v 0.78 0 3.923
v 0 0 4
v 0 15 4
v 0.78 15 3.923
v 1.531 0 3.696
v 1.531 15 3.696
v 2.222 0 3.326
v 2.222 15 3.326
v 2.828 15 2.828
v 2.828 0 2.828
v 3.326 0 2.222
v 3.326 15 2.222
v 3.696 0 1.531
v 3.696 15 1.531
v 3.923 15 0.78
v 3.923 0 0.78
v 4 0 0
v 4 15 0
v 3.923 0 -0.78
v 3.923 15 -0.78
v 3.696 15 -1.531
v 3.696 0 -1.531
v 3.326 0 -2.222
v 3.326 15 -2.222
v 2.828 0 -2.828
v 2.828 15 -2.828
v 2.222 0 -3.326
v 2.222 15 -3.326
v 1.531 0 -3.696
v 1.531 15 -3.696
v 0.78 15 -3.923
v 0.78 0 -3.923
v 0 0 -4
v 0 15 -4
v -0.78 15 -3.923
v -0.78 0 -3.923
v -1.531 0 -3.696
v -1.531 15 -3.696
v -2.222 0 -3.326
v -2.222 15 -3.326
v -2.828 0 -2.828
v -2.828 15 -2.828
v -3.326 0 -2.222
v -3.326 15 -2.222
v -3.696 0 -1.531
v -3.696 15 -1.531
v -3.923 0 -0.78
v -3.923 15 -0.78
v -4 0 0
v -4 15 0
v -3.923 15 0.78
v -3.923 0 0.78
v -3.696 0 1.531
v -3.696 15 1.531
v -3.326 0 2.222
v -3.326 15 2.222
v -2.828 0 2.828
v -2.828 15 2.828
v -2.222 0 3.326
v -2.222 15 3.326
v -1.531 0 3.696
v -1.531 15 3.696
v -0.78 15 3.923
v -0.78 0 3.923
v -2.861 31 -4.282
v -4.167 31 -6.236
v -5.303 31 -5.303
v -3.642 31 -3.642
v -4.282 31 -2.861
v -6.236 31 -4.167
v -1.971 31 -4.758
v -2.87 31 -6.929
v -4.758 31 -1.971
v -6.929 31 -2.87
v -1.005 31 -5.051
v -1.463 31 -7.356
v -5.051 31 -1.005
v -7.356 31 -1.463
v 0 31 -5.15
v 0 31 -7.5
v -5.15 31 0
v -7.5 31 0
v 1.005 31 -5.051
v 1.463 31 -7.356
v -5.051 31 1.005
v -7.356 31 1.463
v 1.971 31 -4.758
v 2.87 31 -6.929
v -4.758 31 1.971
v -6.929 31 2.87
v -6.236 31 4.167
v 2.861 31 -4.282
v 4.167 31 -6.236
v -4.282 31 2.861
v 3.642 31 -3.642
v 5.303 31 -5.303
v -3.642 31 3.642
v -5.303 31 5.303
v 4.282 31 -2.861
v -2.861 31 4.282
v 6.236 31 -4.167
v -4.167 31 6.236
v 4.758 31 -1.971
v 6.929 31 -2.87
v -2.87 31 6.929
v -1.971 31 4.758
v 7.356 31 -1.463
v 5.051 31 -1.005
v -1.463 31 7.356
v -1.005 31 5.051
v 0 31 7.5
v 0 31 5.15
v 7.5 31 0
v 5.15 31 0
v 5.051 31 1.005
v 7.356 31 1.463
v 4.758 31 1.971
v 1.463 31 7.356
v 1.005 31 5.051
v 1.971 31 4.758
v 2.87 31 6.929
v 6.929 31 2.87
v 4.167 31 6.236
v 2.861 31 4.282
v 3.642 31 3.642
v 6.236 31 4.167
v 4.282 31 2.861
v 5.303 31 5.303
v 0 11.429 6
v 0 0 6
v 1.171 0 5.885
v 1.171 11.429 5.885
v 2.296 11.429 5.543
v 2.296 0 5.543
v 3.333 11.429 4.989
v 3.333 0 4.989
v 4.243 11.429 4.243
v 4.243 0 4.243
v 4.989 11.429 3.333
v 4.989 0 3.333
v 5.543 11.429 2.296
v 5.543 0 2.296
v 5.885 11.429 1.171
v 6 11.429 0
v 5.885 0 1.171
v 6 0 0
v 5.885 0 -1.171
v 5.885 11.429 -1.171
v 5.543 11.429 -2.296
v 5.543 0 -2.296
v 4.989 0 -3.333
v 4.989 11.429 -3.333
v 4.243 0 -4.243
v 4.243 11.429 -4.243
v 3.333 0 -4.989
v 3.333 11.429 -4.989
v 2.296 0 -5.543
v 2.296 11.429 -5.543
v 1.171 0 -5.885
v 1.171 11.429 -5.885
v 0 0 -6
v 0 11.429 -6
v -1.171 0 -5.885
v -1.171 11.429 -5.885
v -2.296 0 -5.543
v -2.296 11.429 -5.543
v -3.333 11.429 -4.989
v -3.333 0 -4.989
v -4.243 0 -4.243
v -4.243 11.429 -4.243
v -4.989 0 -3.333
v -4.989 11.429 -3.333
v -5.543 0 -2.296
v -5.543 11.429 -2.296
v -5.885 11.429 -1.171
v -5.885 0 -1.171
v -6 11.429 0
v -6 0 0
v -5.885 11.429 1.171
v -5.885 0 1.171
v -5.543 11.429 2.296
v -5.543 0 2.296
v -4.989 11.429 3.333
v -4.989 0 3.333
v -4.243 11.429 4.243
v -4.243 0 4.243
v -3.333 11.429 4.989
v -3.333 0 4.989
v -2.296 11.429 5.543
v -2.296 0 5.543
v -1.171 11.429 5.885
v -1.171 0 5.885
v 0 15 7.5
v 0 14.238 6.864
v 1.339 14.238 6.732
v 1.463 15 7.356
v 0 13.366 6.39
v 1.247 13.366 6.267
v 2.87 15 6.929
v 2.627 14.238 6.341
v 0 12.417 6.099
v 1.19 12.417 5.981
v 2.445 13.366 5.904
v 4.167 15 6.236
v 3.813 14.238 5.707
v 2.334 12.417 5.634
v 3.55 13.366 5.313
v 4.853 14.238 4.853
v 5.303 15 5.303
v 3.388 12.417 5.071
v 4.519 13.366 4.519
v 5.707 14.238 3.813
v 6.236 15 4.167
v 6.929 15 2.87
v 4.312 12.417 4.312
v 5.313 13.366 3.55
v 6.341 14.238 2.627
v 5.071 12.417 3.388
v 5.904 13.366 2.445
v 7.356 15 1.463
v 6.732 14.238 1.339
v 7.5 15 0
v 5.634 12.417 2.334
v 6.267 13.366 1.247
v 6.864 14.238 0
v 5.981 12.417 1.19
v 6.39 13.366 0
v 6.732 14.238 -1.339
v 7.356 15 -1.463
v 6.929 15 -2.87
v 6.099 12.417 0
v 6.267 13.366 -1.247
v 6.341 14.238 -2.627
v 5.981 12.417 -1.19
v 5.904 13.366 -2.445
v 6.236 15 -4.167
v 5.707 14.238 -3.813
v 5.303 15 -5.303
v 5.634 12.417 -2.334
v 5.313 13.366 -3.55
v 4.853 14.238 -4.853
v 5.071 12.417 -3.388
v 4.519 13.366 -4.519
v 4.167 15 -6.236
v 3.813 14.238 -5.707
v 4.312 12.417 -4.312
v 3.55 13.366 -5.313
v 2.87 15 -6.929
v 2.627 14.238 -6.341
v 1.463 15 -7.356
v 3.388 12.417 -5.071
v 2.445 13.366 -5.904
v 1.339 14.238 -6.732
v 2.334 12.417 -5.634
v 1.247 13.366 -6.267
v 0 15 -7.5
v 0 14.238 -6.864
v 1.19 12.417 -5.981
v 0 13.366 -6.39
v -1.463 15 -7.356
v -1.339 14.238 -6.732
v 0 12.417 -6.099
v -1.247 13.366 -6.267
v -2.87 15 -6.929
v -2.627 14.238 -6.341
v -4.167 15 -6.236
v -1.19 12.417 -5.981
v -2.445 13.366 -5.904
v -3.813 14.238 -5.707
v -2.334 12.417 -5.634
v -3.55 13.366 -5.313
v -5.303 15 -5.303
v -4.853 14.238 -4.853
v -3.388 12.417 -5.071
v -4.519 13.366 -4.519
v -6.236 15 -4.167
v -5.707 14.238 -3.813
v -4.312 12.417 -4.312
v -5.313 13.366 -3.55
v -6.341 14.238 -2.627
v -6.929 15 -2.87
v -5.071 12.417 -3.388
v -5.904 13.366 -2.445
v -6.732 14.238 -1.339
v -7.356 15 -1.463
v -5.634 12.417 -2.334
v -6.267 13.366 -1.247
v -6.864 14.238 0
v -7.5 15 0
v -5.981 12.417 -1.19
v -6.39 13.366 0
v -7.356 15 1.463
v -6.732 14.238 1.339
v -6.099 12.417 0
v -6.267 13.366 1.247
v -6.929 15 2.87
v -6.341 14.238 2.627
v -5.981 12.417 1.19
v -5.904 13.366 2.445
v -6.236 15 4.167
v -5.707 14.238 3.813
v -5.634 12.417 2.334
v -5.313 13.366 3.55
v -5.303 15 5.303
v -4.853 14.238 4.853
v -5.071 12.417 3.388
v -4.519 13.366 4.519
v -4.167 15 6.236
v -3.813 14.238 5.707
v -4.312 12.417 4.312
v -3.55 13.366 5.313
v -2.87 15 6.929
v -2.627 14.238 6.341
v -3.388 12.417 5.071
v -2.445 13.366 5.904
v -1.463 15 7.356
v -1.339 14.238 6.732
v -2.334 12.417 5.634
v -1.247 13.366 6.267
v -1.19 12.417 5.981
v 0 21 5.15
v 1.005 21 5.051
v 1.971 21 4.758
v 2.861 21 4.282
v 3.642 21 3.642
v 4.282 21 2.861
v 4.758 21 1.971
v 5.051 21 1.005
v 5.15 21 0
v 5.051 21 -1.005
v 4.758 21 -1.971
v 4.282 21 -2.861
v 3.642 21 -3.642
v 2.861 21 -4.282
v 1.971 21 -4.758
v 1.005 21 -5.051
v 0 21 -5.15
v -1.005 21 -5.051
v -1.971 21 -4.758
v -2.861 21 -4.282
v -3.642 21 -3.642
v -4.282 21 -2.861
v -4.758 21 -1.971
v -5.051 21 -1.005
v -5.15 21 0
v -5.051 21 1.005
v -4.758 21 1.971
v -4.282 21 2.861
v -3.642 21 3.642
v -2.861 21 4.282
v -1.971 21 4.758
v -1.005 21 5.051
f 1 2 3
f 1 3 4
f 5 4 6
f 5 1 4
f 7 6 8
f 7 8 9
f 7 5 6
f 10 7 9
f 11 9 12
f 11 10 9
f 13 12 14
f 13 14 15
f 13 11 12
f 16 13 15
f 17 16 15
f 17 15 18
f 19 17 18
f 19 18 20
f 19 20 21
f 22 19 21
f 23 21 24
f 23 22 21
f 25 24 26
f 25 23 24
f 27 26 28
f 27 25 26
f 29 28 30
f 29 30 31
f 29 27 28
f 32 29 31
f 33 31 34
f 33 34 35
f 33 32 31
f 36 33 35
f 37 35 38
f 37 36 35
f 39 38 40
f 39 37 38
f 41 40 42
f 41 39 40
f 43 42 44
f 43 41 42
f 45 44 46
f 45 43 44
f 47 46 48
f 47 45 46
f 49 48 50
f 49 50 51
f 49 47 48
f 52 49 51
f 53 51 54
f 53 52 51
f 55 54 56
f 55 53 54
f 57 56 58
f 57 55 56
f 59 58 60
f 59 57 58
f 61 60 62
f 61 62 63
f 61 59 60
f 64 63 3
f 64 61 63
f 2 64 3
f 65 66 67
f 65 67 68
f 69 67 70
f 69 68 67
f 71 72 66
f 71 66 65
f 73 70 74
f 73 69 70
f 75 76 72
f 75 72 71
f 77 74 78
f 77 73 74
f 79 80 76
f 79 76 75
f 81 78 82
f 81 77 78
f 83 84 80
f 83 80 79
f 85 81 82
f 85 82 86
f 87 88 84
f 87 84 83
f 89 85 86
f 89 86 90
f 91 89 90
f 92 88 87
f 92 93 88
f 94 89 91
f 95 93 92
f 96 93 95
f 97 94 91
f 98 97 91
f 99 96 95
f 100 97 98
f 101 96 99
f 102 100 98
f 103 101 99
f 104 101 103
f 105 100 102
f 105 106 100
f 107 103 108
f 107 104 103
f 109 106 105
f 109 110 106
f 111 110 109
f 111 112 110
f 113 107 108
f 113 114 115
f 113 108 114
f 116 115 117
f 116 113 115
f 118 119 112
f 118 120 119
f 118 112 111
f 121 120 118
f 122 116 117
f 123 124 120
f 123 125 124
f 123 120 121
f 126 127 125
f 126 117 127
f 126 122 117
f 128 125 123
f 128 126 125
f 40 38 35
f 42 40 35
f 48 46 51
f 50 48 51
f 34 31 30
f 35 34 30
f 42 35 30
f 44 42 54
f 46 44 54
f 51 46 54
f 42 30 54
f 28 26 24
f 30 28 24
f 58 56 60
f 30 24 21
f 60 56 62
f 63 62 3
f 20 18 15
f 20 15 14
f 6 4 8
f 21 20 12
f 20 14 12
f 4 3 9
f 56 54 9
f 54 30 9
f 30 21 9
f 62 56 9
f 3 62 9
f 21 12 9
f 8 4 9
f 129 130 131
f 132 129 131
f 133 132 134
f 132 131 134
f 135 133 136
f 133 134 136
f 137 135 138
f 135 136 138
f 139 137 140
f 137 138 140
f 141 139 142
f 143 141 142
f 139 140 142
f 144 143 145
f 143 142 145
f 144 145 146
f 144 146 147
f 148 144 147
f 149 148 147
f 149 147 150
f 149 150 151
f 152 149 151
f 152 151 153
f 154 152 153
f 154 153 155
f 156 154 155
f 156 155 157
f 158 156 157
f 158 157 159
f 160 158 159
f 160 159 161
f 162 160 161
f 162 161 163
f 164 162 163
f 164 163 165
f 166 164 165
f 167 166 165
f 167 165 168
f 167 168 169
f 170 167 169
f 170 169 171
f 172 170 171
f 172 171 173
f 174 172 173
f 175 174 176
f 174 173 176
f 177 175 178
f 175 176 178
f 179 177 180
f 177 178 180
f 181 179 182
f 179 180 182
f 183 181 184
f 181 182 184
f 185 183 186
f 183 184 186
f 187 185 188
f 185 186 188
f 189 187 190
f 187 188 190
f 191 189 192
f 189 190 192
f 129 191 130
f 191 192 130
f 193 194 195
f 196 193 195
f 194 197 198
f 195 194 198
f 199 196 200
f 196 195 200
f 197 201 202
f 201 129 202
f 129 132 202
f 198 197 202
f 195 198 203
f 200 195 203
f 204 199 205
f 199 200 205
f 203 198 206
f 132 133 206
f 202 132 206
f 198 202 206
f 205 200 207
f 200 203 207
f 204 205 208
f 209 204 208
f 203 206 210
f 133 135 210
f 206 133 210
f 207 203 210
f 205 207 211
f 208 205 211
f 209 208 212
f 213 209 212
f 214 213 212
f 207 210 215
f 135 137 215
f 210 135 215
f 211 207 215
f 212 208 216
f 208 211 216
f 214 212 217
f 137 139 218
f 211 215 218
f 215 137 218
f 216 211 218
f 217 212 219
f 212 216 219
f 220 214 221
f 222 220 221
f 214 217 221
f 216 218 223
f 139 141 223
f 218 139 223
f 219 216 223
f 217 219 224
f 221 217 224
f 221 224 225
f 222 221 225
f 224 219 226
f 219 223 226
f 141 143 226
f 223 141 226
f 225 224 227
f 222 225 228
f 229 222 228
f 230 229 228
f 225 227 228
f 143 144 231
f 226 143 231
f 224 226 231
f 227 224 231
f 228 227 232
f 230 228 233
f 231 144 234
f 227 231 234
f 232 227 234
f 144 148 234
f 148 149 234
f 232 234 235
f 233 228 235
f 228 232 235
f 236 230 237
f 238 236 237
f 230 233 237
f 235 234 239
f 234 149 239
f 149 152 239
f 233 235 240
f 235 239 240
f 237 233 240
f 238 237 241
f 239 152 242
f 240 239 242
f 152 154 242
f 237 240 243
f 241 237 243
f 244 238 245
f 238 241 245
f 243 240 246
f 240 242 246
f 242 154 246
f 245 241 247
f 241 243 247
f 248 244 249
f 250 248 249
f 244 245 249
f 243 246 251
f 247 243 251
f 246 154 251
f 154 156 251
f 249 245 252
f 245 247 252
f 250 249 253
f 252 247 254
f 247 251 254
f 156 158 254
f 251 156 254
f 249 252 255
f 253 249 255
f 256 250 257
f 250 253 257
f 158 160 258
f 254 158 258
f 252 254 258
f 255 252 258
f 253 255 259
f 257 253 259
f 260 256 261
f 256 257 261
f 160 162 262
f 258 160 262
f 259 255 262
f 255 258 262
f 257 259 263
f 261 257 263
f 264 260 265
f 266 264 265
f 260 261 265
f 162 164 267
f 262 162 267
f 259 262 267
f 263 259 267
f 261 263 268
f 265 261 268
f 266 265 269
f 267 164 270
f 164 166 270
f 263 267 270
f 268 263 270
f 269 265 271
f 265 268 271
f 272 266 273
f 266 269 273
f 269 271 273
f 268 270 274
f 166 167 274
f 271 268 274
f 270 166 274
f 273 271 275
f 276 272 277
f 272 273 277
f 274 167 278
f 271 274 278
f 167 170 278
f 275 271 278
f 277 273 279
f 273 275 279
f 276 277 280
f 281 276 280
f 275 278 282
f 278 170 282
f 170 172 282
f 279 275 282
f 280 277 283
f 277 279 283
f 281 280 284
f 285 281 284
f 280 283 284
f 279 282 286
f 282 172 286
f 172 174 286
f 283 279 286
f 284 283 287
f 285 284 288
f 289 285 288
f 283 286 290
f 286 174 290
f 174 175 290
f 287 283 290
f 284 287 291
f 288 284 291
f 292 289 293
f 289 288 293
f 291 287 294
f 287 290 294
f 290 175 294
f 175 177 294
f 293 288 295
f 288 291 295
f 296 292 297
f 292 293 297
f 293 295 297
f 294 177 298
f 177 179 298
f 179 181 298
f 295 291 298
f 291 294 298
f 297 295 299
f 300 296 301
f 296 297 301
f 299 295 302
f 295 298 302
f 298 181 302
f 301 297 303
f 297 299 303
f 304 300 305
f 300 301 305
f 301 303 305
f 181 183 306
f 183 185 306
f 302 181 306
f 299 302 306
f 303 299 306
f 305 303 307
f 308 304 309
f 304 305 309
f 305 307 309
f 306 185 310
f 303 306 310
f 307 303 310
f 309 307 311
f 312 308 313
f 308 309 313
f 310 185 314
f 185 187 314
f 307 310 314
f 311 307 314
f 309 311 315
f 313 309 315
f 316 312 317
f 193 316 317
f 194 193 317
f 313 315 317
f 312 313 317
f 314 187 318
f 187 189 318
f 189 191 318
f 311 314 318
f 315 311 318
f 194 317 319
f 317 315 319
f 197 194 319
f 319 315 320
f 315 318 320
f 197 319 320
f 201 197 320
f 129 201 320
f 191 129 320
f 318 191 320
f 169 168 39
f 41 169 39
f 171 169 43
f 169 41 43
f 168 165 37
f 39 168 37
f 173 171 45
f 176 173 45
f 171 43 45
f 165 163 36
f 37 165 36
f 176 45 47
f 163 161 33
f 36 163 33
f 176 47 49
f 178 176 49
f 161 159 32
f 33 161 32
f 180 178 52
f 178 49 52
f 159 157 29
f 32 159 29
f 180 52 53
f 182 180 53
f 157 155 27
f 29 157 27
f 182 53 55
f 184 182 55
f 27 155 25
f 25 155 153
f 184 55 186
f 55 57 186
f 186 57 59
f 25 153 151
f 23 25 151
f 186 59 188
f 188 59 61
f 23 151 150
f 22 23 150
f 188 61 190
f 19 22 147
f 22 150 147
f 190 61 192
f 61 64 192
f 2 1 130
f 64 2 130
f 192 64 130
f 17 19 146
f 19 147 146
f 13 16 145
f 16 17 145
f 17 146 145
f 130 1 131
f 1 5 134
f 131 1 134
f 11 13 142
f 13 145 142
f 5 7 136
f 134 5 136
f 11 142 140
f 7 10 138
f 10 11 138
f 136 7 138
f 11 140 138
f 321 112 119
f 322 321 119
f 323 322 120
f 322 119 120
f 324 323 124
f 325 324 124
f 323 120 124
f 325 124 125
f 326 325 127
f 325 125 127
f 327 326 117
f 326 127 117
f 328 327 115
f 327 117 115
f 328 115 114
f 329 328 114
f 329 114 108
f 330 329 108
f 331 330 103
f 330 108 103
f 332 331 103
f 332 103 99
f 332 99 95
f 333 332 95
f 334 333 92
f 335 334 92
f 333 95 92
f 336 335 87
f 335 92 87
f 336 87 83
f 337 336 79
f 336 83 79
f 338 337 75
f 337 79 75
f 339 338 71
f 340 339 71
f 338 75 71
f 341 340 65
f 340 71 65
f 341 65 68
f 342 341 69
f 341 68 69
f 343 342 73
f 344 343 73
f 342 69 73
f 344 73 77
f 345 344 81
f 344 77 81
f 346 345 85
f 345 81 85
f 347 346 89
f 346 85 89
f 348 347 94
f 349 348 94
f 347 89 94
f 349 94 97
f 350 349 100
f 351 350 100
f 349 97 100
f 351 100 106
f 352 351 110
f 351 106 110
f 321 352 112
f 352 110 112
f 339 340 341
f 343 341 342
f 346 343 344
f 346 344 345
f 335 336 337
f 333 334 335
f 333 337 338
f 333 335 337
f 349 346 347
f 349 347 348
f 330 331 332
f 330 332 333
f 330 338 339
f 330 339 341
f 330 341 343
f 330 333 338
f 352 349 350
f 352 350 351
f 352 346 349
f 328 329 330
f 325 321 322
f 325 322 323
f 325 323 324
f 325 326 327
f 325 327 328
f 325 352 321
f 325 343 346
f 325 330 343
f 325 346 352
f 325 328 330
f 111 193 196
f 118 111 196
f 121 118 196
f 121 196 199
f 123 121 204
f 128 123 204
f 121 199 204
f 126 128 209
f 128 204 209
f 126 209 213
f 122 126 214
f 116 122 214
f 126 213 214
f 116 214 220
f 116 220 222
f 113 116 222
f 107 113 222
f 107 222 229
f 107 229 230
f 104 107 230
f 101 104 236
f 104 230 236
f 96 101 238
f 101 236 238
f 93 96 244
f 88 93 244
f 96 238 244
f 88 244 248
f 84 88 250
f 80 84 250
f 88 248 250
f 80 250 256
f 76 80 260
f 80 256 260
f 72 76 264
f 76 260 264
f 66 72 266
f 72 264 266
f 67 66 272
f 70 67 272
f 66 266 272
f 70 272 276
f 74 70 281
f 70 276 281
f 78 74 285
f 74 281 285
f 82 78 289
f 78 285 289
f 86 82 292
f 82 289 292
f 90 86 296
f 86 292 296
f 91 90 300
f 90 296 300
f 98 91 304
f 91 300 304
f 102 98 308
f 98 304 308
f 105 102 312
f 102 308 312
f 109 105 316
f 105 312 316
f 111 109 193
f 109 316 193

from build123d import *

# Parameters (mm, degrees)
SKETCH1_R           = 6
SKETCH1_R_2         = 4
BOSS_EXTRUDE1_DEPTH = 15
SKETCH2_R           = 7.5
BOSS_EXTRUDE2_DEPTH = 16
FILLET1_R           = 5
SKETCH3_R           = 5.15
CUT_EXTRUDE1_DEPTH  = 10


with BuildPart() as part:
    # Sketch1 → Boss-Extrude1 (new body)
    with BuildSketch(Plane(origin=(0, 0, 0), x_dir=(1, 0, 0), z_dir=(0, 1, 0))):
        with Locations(Location((0, 0, 0), (0, 0, 270))):
            Circle(SKETCH1_R)
        with Locations(Location((0, 0, 0), (0, 0, 270))):
            Circle(SKETCH1_R_2, mode=Mode.SUBTRACT)
    extrude(amount=BOSS_EXTRUDE1_DEPTH)

    # Sketch2 → Boss-Extrude2 (add)
    with BuildSketch(Plane(origin=(0, 15, 0), x_dir=(1, 0, 0), z_dir=(0, 1, 0))):
        with Locations(Location((0, 0, 0), (0, 0, 270))):
            Circle(SKETCH2_R)
    extrude(amount=BOSS_EXTRUDE2_DEPTH)

    # Fillet1
    # the kernel refuses this fillet: 5 mm, written as the material it adds along each edge
    with BuildSketch(Plane(origin=(0, 15, 0), x_dir=(0, 0, 1), z_dir=(-1, 0, 0))) as fillet1_piece_1:
        with BuildLine():
            CenterArc((11, -3.570714214), FILLET1_R, 134.427004001, 45.572995999)
            Line((6, -3.570714214), (5.9, -3.570714214))
            Line((5.9, -3.570714214), (5.9, 0))
            Line((5.9, 0), (6, 0.1))
            ThreePointArc((6, 0.1), (6.75, 0.1), (7.43, 0.071414284))
            Line((7.43, 0.071414284), (7.5, 0))
        make_face()
    revolve(axis=Axis((0, 15, 0), (0, 1, 0)))

    # Sketch3 → Cut-Extrude1 (cut)
    with BuildSketch(Plane(origin=(0, 31, 0), x_dir=(1, 0, 0), z_dir=(0, 1, 0))):
        with Locations(Location((0, 0, 0), (0, 0, 270))):
            Circle(SKETCH3_R)
    extrude(amount=-CUT_EXTRUDE1_DEPTH, mode=Mode.SUBTRACT)


solid = part.part
